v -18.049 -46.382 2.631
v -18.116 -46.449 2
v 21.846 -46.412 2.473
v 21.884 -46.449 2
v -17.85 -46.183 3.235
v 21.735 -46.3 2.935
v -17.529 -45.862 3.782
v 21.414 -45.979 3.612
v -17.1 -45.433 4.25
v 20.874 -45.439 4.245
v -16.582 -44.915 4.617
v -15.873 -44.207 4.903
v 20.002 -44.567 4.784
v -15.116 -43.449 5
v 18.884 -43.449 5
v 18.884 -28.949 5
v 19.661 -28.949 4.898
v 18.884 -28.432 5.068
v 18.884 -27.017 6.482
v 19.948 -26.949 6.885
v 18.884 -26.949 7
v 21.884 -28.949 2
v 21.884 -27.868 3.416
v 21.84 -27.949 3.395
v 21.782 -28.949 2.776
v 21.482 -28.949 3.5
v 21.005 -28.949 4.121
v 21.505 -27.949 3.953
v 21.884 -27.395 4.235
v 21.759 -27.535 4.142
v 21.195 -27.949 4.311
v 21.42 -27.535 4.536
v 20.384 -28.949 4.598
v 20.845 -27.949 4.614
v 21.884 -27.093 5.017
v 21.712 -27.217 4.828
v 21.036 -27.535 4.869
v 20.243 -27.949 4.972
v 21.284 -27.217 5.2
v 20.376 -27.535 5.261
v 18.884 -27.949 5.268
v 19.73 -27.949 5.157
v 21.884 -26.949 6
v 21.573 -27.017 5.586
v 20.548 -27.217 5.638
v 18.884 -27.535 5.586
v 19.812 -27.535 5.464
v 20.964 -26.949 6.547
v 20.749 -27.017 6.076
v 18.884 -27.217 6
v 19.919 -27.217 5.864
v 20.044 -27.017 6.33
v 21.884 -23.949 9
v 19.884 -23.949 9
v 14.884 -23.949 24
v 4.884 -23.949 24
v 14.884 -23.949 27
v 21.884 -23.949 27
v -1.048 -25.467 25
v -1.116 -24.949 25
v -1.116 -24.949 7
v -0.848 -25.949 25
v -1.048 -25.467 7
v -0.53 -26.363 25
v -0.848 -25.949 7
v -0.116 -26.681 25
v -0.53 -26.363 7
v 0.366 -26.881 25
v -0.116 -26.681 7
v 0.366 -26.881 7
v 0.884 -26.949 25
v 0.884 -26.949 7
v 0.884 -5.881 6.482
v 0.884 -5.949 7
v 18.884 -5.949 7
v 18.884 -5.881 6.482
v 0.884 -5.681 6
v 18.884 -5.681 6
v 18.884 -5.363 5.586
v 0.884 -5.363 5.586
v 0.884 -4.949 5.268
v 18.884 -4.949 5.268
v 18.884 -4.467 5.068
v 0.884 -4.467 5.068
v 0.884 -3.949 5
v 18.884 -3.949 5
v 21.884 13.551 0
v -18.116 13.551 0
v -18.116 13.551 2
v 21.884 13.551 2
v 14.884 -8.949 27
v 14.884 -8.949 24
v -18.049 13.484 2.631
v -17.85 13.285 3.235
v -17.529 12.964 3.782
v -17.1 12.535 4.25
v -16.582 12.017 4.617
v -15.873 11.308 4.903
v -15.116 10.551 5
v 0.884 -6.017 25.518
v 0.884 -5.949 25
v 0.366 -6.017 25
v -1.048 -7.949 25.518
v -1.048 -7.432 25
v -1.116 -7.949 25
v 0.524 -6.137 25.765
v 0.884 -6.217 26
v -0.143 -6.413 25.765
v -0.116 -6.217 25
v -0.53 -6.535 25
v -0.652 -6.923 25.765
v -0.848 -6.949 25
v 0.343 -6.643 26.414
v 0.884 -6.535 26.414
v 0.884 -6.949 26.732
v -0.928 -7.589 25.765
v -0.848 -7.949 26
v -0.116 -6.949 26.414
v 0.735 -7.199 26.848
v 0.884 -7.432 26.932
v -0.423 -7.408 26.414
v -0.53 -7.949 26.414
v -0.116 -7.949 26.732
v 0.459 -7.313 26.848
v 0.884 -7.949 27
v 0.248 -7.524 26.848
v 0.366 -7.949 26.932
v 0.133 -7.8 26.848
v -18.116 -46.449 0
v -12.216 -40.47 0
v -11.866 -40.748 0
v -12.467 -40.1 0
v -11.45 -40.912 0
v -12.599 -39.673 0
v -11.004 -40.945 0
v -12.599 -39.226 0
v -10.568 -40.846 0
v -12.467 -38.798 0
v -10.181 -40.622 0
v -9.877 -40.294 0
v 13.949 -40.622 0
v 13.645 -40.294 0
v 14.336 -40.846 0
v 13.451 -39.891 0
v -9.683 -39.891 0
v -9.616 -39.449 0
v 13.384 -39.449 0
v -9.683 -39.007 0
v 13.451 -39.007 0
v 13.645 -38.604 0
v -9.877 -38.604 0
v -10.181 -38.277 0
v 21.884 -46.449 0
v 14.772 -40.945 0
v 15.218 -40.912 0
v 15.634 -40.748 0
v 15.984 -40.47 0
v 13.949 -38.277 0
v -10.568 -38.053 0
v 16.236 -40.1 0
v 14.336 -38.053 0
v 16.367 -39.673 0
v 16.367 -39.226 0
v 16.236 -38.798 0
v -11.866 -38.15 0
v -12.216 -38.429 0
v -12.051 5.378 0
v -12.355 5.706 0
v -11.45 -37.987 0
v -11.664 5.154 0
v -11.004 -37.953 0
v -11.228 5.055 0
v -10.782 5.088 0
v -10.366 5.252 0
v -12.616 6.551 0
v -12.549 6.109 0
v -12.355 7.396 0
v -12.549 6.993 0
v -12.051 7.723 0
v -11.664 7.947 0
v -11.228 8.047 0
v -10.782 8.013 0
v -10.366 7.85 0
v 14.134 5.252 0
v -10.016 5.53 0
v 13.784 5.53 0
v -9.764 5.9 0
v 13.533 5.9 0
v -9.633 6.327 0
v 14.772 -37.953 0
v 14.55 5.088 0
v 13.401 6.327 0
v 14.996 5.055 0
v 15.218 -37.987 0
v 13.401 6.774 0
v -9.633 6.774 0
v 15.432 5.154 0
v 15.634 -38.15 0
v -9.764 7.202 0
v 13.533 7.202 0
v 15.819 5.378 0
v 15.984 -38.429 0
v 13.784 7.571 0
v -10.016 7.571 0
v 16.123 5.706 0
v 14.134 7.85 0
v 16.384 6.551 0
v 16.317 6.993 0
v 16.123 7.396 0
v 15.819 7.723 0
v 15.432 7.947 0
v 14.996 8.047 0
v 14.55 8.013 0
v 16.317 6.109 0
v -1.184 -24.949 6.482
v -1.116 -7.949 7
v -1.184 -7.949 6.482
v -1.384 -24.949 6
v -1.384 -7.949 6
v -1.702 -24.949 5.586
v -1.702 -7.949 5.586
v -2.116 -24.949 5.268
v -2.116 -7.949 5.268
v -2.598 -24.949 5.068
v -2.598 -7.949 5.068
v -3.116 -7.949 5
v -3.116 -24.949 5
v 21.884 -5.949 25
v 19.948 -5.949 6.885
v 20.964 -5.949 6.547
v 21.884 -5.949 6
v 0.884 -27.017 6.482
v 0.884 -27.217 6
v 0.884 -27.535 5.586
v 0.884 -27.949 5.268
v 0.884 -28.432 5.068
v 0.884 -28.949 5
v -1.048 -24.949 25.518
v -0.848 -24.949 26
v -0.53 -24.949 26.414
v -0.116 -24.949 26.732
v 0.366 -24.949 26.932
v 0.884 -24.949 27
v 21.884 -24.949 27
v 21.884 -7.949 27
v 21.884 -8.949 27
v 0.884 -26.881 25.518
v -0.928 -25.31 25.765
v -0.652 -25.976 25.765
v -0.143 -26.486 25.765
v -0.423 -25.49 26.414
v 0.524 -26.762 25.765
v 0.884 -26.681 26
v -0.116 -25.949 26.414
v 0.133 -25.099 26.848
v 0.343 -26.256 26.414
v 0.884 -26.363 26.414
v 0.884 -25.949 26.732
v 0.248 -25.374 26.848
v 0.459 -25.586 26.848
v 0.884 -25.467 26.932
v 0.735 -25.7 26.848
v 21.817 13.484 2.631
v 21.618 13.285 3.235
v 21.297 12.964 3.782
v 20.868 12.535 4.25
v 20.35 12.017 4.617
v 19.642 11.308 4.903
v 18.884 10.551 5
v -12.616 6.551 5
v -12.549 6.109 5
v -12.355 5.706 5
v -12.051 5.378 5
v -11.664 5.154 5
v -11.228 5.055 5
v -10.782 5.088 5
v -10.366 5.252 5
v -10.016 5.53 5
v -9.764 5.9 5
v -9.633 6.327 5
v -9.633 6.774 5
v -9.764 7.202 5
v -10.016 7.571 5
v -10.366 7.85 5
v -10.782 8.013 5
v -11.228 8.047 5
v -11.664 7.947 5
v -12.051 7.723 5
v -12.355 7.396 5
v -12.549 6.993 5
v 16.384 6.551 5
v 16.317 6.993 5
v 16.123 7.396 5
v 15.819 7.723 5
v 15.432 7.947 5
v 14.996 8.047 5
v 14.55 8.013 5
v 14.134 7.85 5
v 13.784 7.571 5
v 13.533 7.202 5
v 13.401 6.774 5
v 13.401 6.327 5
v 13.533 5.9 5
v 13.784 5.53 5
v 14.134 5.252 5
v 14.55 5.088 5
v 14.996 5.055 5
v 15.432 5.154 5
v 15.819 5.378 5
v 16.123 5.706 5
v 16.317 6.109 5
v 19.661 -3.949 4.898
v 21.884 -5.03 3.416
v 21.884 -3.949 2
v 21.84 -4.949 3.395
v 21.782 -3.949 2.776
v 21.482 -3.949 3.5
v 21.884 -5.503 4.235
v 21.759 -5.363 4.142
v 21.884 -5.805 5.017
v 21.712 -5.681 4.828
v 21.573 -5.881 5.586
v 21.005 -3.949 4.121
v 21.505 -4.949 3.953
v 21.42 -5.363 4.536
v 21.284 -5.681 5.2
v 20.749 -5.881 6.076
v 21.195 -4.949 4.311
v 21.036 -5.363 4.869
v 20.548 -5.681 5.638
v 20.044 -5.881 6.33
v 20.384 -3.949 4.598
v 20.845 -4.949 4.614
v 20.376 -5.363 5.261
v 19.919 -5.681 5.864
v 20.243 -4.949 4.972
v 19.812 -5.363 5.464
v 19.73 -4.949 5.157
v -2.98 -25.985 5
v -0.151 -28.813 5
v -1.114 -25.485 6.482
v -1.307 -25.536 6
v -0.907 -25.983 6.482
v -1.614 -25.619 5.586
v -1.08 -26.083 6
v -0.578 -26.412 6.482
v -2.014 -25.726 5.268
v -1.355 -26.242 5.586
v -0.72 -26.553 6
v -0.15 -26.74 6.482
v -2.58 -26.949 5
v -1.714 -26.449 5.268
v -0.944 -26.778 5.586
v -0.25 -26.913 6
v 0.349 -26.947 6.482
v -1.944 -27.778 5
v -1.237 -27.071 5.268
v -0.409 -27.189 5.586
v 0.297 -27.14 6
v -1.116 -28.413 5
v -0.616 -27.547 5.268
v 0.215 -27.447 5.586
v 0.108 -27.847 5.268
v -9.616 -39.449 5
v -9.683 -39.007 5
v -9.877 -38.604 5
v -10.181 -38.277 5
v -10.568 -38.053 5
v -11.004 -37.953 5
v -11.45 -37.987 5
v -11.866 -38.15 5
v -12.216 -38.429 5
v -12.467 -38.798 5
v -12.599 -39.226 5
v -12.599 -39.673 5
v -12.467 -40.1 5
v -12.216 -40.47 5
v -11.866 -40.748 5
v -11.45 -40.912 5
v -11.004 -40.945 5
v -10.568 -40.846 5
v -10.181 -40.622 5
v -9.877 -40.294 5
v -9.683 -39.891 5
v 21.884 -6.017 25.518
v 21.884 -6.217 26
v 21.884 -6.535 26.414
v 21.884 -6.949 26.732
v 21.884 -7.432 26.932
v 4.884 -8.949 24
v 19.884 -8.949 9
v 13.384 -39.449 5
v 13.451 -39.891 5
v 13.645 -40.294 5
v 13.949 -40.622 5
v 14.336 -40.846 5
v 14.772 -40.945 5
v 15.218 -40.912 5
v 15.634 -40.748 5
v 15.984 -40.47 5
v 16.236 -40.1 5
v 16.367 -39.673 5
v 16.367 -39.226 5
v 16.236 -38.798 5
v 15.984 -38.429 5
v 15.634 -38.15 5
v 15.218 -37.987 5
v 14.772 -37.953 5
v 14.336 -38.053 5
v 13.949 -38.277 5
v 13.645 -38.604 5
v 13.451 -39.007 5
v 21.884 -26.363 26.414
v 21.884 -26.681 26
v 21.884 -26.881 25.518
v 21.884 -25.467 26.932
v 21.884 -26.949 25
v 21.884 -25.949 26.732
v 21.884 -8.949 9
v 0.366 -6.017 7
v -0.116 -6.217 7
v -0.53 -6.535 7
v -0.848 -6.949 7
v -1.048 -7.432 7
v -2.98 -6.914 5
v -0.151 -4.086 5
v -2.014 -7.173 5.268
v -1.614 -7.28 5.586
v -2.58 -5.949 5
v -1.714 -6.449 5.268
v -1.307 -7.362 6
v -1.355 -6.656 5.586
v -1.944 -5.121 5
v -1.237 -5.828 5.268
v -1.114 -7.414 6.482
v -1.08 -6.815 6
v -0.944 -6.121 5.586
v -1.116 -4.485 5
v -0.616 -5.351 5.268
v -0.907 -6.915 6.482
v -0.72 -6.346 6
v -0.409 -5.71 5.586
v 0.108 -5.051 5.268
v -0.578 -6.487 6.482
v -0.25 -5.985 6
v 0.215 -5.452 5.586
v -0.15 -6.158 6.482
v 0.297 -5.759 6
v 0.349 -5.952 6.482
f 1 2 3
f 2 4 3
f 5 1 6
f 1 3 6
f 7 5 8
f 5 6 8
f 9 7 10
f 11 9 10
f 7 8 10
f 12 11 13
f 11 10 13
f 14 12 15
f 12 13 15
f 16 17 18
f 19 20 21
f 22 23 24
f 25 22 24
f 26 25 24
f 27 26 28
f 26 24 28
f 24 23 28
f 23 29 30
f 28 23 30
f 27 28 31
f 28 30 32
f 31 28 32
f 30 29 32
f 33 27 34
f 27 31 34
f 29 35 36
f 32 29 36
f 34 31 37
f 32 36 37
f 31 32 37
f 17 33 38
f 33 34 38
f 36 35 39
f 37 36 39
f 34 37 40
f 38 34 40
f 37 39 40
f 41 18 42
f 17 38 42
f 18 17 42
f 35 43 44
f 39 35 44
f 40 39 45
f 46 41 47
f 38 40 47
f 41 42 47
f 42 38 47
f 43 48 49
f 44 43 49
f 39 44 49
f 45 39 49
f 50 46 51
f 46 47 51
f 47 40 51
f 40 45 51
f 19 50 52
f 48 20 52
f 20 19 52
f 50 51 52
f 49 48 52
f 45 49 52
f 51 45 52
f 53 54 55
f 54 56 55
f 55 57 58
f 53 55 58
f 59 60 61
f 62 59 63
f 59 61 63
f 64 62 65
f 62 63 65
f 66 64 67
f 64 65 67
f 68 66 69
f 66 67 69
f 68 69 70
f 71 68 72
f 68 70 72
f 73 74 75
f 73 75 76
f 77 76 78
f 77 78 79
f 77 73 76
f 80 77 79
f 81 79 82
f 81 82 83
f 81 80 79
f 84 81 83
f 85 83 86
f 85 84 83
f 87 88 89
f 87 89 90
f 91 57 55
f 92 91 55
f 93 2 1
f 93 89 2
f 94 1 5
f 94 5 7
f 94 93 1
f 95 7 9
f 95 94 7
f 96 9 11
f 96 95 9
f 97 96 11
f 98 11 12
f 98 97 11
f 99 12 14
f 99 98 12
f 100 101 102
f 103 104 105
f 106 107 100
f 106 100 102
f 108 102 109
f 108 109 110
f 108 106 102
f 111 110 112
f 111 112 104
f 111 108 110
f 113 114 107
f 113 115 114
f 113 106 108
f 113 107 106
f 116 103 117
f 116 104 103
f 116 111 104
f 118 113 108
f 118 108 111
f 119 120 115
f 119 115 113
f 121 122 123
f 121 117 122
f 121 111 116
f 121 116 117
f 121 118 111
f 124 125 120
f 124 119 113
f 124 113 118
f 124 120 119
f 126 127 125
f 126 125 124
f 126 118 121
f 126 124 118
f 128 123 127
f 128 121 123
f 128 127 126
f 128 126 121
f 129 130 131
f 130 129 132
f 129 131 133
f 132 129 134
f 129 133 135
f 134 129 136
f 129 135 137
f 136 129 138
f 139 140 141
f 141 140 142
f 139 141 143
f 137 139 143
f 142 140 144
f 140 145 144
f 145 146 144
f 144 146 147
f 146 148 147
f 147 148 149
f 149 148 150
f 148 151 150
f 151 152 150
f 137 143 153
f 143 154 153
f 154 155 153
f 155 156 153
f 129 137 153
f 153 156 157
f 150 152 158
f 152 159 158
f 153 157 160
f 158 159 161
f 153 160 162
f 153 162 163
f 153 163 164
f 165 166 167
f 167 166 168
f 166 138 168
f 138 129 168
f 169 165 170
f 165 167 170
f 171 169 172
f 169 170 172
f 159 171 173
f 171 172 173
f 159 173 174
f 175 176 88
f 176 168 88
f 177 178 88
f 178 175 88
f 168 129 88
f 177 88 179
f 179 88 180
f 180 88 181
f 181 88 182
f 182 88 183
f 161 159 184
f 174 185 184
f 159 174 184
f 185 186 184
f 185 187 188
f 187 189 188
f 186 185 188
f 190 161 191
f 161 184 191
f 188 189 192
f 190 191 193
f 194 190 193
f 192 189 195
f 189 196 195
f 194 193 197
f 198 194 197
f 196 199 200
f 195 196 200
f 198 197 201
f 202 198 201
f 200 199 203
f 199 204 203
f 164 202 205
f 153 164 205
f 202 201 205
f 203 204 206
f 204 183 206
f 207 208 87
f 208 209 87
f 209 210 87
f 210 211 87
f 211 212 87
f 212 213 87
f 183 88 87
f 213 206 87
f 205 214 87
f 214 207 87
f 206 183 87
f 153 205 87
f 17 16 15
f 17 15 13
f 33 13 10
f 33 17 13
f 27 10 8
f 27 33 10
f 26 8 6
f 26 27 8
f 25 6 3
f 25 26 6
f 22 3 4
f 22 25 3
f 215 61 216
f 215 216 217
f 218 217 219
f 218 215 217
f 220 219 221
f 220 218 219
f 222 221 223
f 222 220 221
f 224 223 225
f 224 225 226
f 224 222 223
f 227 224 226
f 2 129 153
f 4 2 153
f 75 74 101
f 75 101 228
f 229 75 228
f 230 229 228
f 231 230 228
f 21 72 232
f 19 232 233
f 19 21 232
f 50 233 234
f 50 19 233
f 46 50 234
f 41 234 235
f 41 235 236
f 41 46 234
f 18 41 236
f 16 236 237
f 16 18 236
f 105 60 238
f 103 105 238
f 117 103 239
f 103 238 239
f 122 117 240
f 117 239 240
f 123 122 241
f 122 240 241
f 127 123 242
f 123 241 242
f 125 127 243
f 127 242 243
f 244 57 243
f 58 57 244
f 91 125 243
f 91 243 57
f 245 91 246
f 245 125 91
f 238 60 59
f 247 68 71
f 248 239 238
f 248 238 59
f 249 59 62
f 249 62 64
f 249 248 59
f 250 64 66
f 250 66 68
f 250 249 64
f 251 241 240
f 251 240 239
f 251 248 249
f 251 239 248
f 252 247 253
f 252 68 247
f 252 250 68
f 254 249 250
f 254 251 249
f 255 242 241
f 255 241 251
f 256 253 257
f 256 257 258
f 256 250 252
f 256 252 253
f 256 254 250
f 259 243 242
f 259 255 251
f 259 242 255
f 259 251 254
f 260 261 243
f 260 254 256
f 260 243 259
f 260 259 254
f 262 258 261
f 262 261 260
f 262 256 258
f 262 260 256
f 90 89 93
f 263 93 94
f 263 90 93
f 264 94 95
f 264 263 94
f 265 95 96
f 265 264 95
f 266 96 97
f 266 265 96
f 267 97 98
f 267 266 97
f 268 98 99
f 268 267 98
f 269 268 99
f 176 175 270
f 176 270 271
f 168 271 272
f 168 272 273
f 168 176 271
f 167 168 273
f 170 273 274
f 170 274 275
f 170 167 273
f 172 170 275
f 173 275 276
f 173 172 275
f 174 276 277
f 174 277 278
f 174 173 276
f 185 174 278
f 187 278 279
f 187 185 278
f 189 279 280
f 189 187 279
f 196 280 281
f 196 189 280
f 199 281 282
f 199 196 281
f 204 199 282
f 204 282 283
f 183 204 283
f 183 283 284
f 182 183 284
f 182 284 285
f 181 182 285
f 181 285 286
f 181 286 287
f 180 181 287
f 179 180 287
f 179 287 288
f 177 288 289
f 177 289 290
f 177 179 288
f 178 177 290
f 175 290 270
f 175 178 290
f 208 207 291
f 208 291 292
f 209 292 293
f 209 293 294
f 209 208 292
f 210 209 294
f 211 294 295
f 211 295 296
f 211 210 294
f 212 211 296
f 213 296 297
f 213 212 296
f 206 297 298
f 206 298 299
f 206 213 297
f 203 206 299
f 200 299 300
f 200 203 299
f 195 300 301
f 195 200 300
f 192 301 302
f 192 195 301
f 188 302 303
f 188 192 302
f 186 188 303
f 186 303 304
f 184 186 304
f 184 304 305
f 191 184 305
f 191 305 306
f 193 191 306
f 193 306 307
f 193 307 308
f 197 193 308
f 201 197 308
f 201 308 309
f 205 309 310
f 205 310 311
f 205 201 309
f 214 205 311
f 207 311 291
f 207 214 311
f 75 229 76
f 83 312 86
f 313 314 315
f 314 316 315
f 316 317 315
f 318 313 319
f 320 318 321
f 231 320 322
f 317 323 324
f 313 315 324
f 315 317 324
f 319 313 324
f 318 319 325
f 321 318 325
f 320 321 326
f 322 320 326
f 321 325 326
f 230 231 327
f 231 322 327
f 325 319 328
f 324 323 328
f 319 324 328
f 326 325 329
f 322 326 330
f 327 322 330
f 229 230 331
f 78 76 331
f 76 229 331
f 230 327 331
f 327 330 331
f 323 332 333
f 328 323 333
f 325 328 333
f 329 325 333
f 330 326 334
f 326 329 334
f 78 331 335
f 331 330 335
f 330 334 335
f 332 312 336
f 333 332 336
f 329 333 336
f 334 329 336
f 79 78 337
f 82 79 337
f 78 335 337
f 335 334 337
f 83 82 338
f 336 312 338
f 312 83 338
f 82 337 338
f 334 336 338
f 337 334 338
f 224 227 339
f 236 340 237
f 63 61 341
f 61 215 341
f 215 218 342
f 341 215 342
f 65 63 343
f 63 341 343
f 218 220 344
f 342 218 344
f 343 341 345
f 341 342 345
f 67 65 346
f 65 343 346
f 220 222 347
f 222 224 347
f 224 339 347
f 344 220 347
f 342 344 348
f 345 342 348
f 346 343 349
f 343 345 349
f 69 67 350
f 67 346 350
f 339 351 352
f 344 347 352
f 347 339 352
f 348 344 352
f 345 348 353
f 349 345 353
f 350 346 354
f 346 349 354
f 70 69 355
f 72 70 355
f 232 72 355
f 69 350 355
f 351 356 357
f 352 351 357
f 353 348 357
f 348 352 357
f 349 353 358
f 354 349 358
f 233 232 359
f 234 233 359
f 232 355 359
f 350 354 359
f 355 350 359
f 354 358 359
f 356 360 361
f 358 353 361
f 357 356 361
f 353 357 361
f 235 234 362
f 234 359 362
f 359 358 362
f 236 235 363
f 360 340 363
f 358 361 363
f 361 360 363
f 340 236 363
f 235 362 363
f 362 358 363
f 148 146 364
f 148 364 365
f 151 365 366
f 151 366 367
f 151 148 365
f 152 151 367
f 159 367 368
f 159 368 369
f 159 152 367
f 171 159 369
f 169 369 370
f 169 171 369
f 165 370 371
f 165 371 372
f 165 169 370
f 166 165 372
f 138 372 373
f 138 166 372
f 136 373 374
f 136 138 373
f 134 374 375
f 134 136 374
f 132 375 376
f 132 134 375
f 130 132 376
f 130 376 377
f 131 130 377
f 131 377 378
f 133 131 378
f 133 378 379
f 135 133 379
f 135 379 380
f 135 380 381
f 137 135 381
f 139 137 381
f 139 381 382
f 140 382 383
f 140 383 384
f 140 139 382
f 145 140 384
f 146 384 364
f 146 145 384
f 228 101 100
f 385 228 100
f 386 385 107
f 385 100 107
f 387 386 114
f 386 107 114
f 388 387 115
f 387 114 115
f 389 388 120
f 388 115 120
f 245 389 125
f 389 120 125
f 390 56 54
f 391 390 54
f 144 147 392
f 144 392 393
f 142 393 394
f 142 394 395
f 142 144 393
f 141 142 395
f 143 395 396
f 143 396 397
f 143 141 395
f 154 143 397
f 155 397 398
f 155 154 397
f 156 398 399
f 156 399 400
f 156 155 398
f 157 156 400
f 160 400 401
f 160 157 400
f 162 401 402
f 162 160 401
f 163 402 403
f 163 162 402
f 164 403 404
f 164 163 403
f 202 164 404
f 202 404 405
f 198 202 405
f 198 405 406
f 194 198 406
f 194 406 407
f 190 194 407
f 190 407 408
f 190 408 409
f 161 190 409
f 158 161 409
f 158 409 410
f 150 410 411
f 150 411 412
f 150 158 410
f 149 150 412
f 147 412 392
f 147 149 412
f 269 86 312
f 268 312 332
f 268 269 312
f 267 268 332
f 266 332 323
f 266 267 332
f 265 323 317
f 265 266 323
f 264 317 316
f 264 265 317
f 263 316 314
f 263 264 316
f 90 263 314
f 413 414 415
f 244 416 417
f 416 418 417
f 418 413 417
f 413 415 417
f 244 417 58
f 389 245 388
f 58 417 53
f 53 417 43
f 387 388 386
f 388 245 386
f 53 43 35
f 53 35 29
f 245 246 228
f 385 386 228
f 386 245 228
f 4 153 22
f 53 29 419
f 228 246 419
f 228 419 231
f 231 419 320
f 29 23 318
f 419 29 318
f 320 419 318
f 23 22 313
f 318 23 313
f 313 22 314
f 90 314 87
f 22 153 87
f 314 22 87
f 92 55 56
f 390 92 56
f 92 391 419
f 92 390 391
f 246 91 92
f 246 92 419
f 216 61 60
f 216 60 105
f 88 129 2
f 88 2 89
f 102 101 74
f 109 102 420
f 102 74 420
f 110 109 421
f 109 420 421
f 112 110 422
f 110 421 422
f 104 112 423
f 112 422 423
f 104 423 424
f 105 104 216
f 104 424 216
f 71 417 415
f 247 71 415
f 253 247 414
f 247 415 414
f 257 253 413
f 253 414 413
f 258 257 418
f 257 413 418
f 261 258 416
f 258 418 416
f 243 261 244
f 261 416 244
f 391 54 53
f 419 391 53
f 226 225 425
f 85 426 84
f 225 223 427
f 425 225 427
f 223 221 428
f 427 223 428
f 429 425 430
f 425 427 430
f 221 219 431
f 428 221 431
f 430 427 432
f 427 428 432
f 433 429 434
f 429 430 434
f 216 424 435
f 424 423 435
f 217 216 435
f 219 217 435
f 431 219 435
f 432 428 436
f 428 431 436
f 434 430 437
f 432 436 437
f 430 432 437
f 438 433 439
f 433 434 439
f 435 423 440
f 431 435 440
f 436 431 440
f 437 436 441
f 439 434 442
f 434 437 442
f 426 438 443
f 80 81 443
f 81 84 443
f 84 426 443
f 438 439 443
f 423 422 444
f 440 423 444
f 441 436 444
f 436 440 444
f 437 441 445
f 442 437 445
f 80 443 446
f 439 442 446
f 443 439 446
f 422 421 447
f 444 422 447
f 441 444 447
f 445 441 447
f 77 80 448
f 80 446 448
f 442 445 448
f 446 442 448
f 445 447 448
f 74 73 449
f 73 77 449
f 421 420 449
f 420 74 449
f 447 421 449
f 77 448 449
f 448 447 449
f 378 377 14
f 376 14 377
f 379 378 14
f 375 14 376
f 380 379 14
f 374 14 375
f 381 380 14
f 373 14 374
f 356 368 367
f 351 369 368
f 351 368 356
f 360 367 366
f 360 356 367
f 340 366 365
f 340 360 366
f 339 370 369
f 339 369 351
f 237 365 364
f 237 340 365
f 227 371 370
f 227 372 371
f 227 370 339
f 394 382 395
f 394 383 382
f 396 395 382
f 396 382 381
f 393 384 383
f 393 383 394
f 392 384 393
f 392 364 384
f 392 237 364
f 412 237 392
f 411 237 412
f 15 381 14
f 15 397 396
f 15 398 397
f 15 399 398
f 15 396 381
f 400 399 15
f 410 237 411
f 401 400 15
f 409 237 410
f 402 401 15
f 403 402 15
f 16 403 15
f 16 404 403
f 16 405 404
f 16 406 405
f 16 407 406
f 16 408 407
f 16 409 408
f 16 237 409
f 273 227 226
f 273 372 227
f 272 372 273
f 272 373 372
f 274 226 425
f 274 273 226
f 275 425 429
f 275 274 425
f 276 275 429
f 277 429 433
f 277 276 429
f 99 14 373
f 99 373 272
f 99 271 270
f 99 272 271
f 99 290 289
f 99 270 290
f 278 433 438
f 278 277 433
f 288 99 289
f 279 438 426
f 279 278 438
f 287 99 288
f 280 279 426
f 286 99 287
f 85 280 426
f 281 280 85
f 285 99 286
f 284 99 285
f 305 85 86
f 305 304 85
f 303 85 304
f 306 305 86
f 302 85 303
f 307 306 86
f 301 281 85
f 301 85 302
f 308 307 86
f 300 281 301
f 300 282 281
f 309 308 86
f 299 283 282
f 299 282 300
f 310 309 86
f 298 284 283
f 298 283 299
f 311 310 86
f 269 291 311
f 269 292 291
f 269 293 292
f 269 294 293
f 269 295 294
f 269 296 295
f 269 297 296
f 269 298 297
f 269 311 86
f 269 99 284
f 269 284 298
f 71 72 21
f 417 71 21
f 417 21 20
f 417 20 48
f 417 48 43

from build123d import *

# Parameters (mm, degrees)
SKETCH1_W           = 40
SKETCH1_H           = 60
SKETCH1_R           = 1.5
BOSS_EXTRUDE1_DEPTH = 5
SKETCH3_W           = 23
SKETCH3_H           = 21
BOSS_EXTRUDE2_DEPTH = 22
CUT_EXTRUDE1_START  = -3
SKETCH4_W           = 2
SKETCH4_H           = 15
CUT_EXTRUDE1_DEPTH  = 15
FILLET1_R           = 3
FILLET2_R           = 2


with BuildPart() as part:
    # Sketch1 → Boss-Extrude1 (new body)
    with BuildSketch(Plane.XY):
        with Locations((1.884057971, -16.449275362)):
            Rectangle(SKETCH1_W, SKETCH1_H)
        with Locations((14.884057971, 6.550724638)):
            Circle(SKETCH1_R, mode=Mode.SUBTRACT)
        with Locations(Location((14.884057971, -39.449275362, 0), (0, 0, 180))):
            Circle(SKETCH1_R, mode=Mode.SUBTRACT)
        with Locations((-11.115942029, -39.449275362)):
            Circle(SKETCH1_R, mode=Mode.SUBTRACT)
        with Locations(Location((-11.115942029, 6.550724638, 0), (0, 0, 180))):
            Circle(SKETCH1_R, mode=Mode.SUBTRACT)
    extrude(amount=BOSS_EXTRUDE1_DEPTH)

    # Sketch3 → Boss-Extrude2 (add)
    with BuildSketch(Plane.XY.offset(5)):
        with Locations((10.384057971, -16.449275362)):
            Rectangle(SKETCH3_W, SKETCH3_H)
    extrude(amount=BOSS_EXTRUDE2_DEPTH)

    # Sketch4 → Cut-Extrude1 (cut)
    with BuildSketch(Plane.XZ.offset(26.949275362).offset(CUT_EXTRUDE1_START)):
        with Locations((20.884057971, 16.5)):
            Rectangle(SKETCH4_W, SKETCH4_H)
        Polygon((14.884057971, 24), (14.884057971, 14), (19.884057971, 9), (19.884057971, 24), align=None)
        Polygon((14.884057971, 27), (14.884057971, 24), (19.884057971, 24), (21.884057971, 24), (21.884057971, 27), align=None)
        Polygon((14.884057971, 24), (4.884057971, 24), (14.884057971, 14), align=None)
    extrude(amount=-CUT_EXTRUDE1_DEPTH, mode=Mode.SUBTRACT)

    # Fillet1
    fillet1_edges = [part.edges().sort_by_distance(p)[0] for p in [
        (21.884057971, -36.699275362, 5),
        (1.884057971, 13.550724638, 5),
        (21.884057971, 3.800724638, 5),
        (-18.115942029, -16.449275362, 5),
        (1.884057971, -46.449275362, 5),
    ]]
    fillet(fillet1_edges, radius=FILLET1_R)

    # Fillet2
    # the kernel refuses this fillet: 2 mm, written as the material it takes off along each edge
    with BuildSketch(Plane(origin=(0.884057971, -7.949275362, 25), x_dir=(-1, 0, 0), z_dir=(0, 0, 1))) as fillet2_piece_1_section:
        Polygon((0, 0), (FILLET2_R * 1.02, 0), (FILLET2_R * 1.02, -FILLET2_R * 1.02), (0, -FILLET2_R * 1.02), align=None)
    fillet2_piece_1 = extrude(amount=FILLET2_R * 1.02, mode=Mode.PRIVATE)
    fillet2_piece_1 = fillet2_piece_1 - Plane(origin=(0.884057971, -7.949275362, 25), x_dir=(0.7071067811865475, -0.7071067811865475, 0), z_dir=(0, 0, 1)) * Sphere(FILLET2_R, mode=Mode.PRIVATE)
    add(fillet2_piece_1, mode=Mode.SUBTRACT)
    with BuildSketch(Plane(origin=(0.884057971, -24.949275362, 25), x_dir=(-1, 0, 0), z_dir=(0, 0, 1))) as fillet2_piece_2_section:
        Polygon((0, 0), (FILLET2_R * 1.02, 0), (FILLET2_R * 1.02, FILLET2_R * 1.02), (0, FILLET2_R * 1.02), align=None)
    fillet2_piece_2 = extrude(amount=FILLET2_R * 1.02, mode=Mode.PRIVATE)
    fillet2_piece_2 = fillet2_piece_2 - Plane(origin=(0.884057971, -24.949275362, 25), x_dir=(0.7071067811865475, 0.7071067811865475, 0), z_dir=(0, 0, 1)) * Sphere(FILLET2_R, mode=Mode.PRIVATE)
    add(fillet2_piece_2, mode=Mode.SUBTRACT)
    with BuildSketch(Plane(origin=(-1.115942029, -5.949275362, 5), x_dir=(0, -1, 0), z_dir=(0, 0, 1))) as fillet2_piece_3:
        with BuildLine():
            CenterArc((FILLET2_R, FILLET2_R), FILLET2_R, 180, 90)
            Line((0, FILLET2_R), (0, 0))
            Line((0, 0), (FILLET2_R, 0))
        make_face()
    extrude(amount=20, mode=Mode.SUBTRACT)
    with BuildSketch(Plane(origin=(-1.115942029, -26.949275362, 5), x_dir=(0, 1, 0), z_dir=(0, 0, 1))) as fillet2_piece_4:
        with BuildLine():
            CenterArc((FILLET2_R, -FILLET2_R), FILLET2_R, 90, 90)
            Line((0, -FILLET2_R), (0, 0))
            Line((0, 0), (FILLET2_R, 0))
        make_face()
    extrude(amount=20, mode=Mode.SUBTRACT)
    with BuildSketch(Plane(origin=(0.884057971, -5.949275362, 27), x_dir=(0, -1, 0), z_dir=(1, 0, 0))) as fillet2_piece_5:
        with BuildLine():
            CenterArc((FILLET2_R, FILLET2_R), FILLET2_R, 180, 90)
            Line((0, FILLET2_R), (0, 0))
            Line((0, 0), (FILLET2_R, 0))
        make_face()
    extrude(amount=26, mode=Mode.SUBTRACT)
    with BuildSketch(Plane(origin=(-1.115942029, -24.949275362, 27), x_dir=(0, 0, -1), z_dir=(0, 1, 0))) as fillet2_piece_6:
        with BuildLine():
            CenterArc((FILLET2_R, -FILLET2_R), FILLET2_R, 90, 90)
            Line((0, -FILLET2_R), (0, 0))
            Line((0, 0), (FILLET2_R, 0))
        make_face()
    extrude(amount=17, mode=Mode.SUBTRACT)
    with BuildSketch(Plane(origin=(26.884057971, -26.949275362, 27), x_dir=(0, 0, -1), z_dir=(-1, 0, 0))) as fillet2_piece_7:
        with BuildLine():
            CenterArc((FILLET2_R, -FILLET2_R), FILLET2_R, 90, 90)
            Line((0, -FILLET2_R), (0, 0))
            Line((0, 0), (FILLET2_R, 0))
        make_face()
    extrude(amount=26, mode=Mode.SUBTRACT)
    # the kernel refuses this fillet: 2 mm, written as the material it adds along each edge
    with BuildSketch(Plane(origin=(-1.115942029, -24.949275362, 5), x_dir=(-1, 0, 0), z_dir=(0, 1, 0))) as fillet2_2_piece_1:
        with BuildLine():
            CenterArc((FILLET2_R, FILLET2_R), FILLET2_R, 180, 90)
            Line((0, FILLET2_R), (0, 0))
            Line((0, 0), (FILLET2_R, 0))
        make_face()
    extrude(amount=17)
    with BuildSketch(Plane(origin=(18.884057971, -26.949275362, 5), x_dir=(0, -1, 0), z_dir=(-1, 0, 0)), Plane(origin=(0.884057971, -5.949275362, 5), x_dir=(0, 1, 0), z_dir=(1, 0, 0))) as fillet2_2_piece_2:
        with BuildLine():
            CenterArc((FILLET2_R, FILLET2_R), FILLET2_R, 180, 90)
            Line((0, FILLET2_R), (0, 0))
            Line((0, 0), (FILLET2_R, 0))
        make_face()
    extrude(amount=18)
    with BuildSketch(Plane(origin=(18.884057971, -5.949275362, 2), x_dir=(-0.09638996566753259, 0, -0.9953436464450918), z_dir=(-0.9953436464450918, 0, 0.09638996566753259))) as fillet2_2_piece_3_section:
        with BuildLine():
            CenterArc((3 + FILLET2_R, -FILLET2_R), FILLET2_R, 90, 90)
            Line((3 + FILLET2_R, 0), (3, 0))
            Line((3, 0), (3, -FILLET2_R))
        make_face()
    fillet2_2_piece_3 = revolve(axis=Axis((18.884057971, -5.949275362, 2), (0, -1, 0)), revolution_arc=185.531326158, mode=Mode.PRIVATE)
    fillet2_2_piece_3 = split(fillet2_2_piece_3, bisect_by=Plane(origin=(21.104944702, -5.375674968, 0), z_dir=(0, 0, 1)), keep=Keep.TOP, mode=Mode.PRIVATE)
    fillet2_2_piece_3 = split(fillet2_2_piece_3, bisect_by=Plane(origin=(21.884057971, -5.375674968, 4.220886685), z_dir=(-1, 0, 0)), keep=Keep.TOP, mode=Mode.PRIVATE)
    add(fillet2_2_piece_3)
    with BuildSketch(Plane(origin=(18.884057971, -26.949275362, 2), x_dir=(-0.09638996566753259, 0, -0.9953436464450918), z_dir=(-0.9953436464450918, 0, 0.09638996566753259))) as fillet2_2_piece_4_section:
        with BuildLine():
            CenterArc((3 + FILLET2_R, FILLET2_R), FILLET2_R, 180, 90)
            Line((3 + FILLET2_R, 0), (3, 0))
            Line((3, 0), (3, FILLET2_R))
        make_face()
    fillet2_2_piece_4 = revolve(axis=Axis((18.884057971, -26.949275362, 2), (0, -1, 0)), revolution_arc=185.531326158, mode=Mode.PRIVATE)
    fillet2_2_piece_4 = split(fillet2_2_piece_4, bisect_by=Plane(origin=(21.104944699, -27.522875755, 0), z_dir=(0, 0, 1)), keep=Keep.TOP, mode=Mode.PRIVATE)
    fillet2_2_piece_4 = split(fillet2_2_piece_4, bisect_by=Plane(origin=(21.884057971, -27.522875755, 4.220886633), z_dir=(-1, 0, 0)), keep=Keep.TOP, mode=Mode.PRIVATE)
    add(fillet2_2_piece_4)
    with BuildSketch(Plane(origin=(0.884057971, -7.949275362, 5), x_dir=(-1, 0, 0), z_dir=(0, -1, 0))) as fillet2_2_piece_5:
        with BuildLine():
            CenterArc((2 + FILLET2_R, -FILLET2_R), FILLET2_R, 90, 90)
            Line((2, -FILLET2_R), (2, 0))
            Line((2, 0), (2 + FILLET2_R, 0))
        make_face()
    revolve(axis=Axis((0.884057971, -7.949275362, 5), (0, 0, -1)), revolution_arc=90)
    with BuildSketch(Plane(origin=(0.884057971, -24.949275362, 5), x_dir=(-1, 0, 0), z_dir=(0, 1, 0))) as fillet2_2_piece_6:
        with BuildLine():
            CenterArc((2 + FILLET2_R, FILLET2_R), FILLET2_R, 180, 90)
            Line((2, FILLET2_R), (2, 0))
            Line((2, 0), (2 + FILLET2_R, 0))
        make_face()
    revolve(axis=Axis((0.884057971, -24.949275362, 5), (0, 0, 1)), revolution_arc=90)


solid = part.part
